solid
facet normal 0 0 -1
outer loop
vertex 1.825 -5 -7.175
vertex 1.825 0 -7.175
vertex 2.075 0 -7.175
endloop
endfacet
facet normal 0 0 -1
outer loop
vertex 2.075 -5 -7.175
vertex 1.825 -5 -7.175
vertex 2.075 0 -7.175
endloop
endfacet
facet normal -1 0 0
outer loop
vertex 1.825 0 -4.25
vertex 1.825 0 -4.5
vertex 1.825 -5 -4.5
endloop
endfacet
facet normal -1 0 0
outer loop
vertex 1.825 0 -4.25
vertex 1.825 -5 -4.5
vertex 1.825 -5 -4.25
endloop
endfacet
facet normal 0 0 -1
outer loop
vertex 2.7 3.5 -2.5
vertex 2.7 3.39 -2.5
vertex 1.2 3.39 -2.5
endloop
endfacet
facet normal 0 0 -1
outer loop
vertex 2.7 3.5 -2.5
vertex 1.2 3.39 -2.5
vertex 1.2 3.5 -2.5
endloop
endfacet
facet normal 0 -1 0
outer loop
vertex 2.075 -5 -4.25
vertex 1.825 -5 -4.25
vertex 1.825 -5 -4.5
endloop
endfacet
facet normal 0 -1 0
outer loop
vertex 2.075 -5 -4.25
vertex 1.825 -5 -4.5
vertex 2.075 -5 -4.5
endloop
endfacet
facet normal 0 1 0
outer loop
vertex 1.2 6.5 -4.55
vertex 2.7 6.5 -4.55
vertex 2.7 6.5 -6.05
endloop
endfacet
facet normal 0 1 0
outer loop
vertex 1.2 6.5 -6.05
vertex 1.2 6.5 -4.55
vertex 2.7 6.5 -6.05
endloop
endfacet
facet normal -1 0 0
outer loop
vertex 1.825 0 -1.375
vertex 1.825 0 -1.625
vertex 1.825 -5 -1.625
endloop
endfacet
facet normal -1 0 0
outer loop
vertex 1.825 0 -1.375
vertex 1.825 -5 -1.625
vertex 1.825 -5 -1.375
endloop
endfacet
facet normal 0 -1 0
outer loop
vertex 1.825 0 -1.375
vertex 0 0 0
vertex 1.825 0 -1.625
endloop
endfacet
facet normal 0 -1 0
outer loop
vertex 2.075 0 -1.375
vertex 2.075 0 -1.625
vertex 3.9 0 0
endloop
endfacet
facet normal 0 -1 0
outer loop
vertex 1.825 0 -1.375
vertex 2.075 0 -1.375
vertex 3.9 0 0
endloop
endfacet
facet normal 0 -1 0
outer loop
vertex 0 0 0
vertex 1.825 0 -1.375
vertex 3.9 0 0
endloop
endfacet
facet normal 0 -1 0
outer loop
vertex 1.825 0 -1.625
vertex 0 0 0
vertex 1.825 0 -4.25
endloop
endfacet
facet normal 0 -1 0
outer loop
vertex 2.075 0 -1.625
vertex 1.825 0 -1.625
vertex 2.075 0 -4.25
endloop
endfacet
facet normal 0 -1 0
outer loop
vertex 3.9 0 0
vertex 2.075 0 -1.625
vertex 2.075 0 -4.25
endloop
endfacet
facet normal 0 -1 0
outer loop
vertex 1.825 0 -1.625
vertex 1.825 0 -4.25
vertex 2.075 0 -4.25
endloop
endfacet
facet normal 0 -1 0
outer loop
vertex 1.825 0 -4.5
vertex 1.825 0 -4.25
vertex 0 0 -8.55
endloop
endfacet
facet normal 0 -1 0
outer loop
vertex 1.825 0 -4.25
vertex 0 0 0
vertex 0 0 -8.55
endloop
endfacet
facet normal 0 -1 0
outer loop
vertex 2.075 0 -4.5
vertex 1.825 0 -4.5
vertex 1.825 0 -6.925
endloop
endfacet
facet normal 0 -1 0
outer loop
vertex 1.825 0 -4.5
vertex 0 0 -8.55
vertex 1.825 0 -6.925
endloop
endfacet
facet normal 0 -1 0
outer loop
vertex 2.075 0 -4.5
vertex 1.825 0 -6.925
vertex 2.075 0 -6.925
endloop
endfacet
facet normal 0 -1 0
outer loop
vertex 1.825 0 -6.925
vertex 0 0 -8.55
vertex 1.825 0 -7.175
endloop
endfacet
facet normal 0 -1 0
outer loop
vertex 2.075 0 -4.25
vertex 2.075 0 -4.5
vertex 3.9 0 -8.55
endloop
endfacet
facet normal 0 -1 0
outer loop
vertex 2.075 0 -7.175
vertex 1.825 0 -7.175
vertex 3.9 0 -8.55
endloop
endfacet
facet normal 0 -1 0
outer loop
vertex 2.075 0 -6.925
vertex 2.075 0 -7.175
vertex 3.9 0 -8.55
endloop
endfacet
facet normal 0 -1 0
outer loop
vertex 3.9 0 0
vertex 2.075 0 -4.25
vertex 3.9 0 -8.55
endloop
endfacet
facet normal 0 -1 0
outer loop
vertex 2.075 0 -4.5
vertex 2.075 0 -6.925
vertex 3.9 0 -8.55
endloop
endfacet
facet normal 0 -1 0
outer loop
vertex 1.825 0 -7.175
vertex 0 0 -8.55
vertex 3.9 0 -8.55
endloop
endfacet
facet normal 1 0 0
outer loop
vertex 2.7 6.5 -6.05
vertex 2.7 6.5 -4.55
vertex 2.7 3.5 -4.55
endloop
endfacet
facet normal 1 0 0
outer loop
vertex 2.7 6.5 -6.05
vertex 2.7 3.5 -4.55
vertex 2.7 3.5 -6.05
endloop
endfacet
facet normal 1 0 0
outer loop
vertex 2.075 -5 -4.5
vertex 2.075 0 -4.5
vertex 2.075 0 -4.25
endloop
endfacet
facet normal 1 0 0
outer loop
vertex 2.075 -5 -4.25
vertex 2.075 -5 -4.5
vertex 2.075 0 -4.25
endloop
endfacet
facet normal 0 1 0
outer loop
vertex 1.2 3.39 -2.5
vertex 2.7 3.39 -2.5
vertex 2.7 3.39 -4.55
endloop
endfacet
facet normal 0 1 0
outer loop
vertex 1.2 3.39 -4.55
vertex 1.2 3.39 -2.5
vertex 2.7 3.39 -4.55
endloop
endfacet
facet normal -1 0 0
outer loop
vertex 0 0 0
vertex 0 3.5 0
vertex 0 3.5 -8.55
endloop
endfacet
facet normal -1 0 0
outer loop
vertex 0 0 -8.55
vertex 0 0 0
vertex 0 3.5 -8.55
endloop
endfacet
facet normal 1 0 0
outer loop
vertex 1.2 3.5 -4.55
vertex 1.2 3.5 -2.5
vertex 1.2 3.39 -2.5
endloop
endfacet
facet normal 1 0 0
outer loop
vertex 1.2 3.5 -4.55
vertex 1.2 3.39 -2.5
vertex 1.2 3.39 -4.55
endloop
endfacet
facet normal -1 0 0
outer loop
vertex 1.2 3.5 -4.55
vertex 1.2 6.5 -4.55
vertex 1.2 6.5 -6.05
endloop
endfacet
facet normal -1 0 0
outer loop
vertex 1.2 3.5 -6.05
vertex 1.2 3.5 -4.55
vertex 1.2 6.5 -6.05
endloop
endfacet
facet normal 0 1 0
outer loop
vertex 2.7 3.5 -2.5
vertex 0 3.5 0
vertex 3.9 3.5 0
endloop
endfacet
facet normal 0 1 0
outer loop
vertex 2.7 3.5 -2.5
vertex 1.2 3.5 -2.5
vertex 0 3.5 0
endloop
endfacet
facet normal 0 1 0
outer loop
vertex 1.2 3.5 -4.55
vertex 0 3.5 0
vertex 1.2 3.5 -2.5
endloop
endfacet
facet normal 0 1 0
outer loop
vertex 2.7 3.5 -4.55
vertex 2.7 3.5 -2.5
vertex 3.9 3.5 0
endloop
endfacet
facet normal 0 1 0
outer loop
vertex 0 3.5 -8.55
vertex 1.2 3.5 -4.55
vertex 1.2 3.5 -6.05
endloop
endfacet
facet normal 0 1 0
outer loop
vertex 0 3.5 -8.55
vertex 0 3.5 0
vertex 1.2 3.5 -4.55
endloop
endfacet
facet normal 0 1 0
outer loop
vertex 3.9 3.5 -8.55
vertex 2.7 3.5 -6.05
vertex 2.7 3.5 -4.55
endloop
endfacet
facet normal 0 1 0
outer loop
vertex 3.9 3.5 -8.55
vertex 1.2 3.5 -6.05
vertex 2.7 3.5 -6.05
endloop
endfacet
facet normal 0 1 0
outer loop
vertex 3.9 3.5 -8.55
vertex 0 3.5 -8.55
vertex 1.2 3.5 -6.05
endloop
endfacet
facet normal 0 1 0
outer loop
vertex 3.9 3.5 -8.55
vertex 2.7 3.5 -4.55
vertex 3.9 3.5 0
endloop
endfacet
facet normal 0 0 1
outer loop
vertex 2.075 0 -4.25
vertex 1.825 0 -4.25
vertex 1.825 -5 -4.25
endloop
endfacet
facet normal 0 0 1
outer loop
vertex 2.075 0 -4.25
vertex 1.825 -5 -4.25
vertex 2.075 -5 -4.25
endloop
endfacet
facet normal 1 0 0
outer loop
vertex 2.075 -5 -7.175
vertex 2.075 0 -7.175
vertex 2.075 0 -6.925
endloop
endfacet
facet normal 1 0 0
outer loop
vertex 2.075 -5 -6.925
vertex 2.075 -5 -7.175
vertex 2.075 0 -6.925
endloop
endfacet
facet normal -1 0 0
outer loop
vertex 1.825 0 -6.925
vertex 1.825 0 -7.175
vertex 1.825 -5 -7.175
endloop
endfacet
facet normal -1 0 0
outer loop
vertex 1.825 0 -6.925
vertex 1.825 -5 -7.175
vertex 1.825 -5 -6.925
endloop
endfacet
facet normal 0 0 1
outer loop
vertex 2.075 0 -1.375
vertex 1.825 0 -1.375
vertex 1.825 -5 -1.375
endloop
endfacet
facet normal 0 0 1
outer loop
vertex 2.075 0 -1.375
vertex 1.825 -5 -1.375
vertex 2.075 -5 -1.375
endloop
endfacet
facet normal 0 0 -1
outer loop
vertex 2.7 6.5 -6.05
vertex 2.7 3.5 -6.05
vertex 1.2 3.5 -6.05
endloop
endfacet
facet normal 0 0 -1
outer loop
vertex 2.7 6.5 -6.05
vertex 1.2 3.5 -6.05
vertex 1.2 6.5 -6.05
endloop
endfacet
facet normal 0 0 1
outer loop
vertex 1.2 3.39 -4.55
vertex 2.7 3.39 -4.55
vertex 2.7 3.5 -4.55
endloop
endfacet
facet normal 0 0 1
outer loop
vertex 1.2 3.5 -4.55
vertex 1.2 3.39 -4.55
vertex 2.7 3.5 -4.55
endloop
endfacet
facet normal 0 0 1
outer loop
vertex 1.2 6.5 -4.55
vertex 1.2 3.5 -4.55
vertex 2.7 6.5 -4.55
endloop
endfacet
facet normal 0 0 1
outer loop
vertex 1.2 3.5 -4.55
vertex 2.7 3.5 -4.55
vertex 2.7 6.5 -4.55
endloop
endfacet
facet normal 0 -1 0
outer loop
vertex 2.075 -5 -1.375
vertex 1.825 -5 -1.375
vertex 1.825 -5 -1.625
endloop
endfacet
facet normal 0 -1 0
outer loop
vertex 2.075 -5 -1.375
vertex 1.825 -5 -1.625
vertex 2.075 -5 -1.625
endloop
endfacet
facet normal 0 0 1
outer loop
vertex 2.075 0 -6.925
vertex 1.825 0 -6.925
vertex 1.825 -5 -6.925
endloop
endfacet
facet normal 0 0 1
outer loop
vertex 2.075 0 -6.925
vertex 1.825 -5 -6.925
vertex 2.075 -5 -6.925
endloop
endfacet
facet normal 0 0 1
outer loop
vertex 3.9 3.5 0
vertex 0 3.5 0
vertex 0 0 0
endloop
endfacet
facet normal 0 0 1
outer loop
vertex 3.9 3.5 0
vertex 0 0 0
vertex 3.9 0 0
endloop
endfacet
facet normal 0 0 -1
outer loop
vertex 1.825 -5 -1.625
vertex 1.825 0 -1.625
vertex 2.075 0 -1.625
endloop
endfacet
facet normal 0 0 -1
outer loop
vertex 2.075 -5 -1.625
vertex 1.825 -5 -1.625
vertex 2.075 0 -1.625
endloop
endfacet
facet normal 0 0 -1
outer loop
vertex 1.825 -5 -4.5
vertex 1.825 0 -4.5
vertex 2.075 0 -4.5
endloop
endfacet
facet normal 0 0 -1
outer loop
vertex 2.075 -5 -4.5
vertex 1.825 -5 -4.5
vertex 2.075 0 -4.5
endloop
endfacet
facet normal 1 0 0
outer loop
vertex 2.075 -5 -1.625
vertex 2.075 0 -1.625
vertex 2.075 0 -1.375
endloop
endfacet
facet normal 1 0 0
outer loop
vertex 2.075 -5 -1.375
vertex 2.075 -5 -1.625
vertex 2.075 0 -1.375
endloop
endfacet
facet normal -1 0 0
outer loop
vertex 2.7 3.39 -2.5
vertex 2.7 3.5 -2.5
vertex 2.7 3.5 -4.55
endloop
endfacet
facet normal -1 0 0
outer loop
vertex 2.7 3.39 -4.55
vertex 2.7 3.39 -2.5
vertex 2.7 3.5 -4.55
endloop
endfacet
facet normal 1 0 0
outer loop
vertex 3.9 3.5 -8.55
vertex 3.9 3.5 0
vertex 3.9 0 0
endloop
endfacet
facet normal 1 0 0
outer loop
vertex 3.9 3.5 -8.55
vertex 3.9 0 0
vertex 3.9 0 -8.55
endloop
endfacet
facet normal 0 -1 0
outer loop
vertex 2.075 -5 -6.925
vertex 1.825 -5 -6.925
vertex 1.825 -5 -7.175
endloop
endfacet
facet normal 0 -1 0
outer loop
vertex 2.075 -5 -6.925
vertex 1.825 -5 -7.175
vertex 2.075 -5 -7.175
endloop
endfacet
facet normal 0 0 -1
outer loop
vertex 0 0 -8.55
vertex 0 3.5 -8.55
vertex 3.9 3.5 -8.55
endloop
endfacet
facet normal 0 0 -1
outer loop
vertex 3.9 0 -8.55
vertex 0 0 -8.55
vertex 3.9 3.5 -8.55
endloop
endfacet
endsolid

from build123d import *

# Parameters (mm, degrees)
SKETCH1_W           = 3.9
SKETCH1_H           = 8.55
BOSS_EXTRUDE1_DEPTH = 3.5
SKETCH2_W           = 1.5
SKETCH2_H           = 3
BOSS_EXTRUDE2_DEPTH = 1.5
SKETCH3_W           = 2.05
SKETCH3_H           = 0.11
CUT_EXTRUDE1_DEPTH  = 1.5
SKETCH4_W           = 0.25
SKETCH4_H           = 0.25
BOSS_EXTRUDE3_DEPTH = 5
SKETCH5_W           = 0.25
SKETCH5_H           = 0.25
BOSS_EXTRUDE4_DEPTH = 5
SKETCH6_W           = 0.25
SKETCH6_H           = 0.25
BOSS_EXTRUDE5_DEPTH = 5


with BuildPart() as part:
    # Sketch1 → Boss-Extrude1 (new body)
    with BuildSketch(Plane(origin=(0, 3.5, 0), x_dir=(1, 0, 0), z_dir=(0, 1, 0))):
        with Locations((1.95, 4.275)):
            Rectangle(SKETCH1_W, SKETCH1_H)
    extrude(amount=-BOSS_EXTRUDE1_DEPTH)

    # Sketch2 → Boss-Extrude2 (add)
    with BuildSketch(Plane(origin=(2.7, 0, 0), x_dir=(0, 0, -1), z_dir=(1, 0, 0))):
        with Locations((5.3, 5)):
            Rectangle(SKETCH2_W, SKETCH2_H)
    extrude(amount=-BOSS_EXTRUDE2_DEPTH)

    # Sketch3 → Cut-Extrude1 (cut)
    with BuildSketch(Plane(origin=(2.7, 0, 0), x_dir=(0, 0, -1), z_dir=(1, 0, 0))):
        with Locations((3.525, 3.445)):
            Rectangle(SKETCH3_W, SKETCH3_H)
    extrude(amount=-CUT_EXTRUDE1_DEPTH, mode=Mode.SUBTRACT)

    # Sketch4 → Boss-Extrude3 (add)
    with BuildSketch(Plane.XZ):
        with Locations((1.95, -7.05)):
            Rectangle(SKETCH4_W, SKETCH4_H)
    extrude(amount=BOSS_EXTRUDE3_DEPTH)

    # Sketch5 → Boss-Extrude4 (add)
    with BuildSketch(Plane.XZ):
        with Locations((1.95, -1.5)):
            Rectangle(SKETCH5_W, SKETCH5_H)
    extrude(amount=BOSS_EXTRUDE4_DEPTH)

    # Sketch6 → Boss-Extrude5 (add)
    with BuildSketch(Plane.XZ):
        with Locations((1.95, -4.375)):
            Rectangle(SKETCH6_W, SKETCH6_H)
    extrude(amount=BOSS_EXTRUDE5_DEPTH)


solid = part.part
